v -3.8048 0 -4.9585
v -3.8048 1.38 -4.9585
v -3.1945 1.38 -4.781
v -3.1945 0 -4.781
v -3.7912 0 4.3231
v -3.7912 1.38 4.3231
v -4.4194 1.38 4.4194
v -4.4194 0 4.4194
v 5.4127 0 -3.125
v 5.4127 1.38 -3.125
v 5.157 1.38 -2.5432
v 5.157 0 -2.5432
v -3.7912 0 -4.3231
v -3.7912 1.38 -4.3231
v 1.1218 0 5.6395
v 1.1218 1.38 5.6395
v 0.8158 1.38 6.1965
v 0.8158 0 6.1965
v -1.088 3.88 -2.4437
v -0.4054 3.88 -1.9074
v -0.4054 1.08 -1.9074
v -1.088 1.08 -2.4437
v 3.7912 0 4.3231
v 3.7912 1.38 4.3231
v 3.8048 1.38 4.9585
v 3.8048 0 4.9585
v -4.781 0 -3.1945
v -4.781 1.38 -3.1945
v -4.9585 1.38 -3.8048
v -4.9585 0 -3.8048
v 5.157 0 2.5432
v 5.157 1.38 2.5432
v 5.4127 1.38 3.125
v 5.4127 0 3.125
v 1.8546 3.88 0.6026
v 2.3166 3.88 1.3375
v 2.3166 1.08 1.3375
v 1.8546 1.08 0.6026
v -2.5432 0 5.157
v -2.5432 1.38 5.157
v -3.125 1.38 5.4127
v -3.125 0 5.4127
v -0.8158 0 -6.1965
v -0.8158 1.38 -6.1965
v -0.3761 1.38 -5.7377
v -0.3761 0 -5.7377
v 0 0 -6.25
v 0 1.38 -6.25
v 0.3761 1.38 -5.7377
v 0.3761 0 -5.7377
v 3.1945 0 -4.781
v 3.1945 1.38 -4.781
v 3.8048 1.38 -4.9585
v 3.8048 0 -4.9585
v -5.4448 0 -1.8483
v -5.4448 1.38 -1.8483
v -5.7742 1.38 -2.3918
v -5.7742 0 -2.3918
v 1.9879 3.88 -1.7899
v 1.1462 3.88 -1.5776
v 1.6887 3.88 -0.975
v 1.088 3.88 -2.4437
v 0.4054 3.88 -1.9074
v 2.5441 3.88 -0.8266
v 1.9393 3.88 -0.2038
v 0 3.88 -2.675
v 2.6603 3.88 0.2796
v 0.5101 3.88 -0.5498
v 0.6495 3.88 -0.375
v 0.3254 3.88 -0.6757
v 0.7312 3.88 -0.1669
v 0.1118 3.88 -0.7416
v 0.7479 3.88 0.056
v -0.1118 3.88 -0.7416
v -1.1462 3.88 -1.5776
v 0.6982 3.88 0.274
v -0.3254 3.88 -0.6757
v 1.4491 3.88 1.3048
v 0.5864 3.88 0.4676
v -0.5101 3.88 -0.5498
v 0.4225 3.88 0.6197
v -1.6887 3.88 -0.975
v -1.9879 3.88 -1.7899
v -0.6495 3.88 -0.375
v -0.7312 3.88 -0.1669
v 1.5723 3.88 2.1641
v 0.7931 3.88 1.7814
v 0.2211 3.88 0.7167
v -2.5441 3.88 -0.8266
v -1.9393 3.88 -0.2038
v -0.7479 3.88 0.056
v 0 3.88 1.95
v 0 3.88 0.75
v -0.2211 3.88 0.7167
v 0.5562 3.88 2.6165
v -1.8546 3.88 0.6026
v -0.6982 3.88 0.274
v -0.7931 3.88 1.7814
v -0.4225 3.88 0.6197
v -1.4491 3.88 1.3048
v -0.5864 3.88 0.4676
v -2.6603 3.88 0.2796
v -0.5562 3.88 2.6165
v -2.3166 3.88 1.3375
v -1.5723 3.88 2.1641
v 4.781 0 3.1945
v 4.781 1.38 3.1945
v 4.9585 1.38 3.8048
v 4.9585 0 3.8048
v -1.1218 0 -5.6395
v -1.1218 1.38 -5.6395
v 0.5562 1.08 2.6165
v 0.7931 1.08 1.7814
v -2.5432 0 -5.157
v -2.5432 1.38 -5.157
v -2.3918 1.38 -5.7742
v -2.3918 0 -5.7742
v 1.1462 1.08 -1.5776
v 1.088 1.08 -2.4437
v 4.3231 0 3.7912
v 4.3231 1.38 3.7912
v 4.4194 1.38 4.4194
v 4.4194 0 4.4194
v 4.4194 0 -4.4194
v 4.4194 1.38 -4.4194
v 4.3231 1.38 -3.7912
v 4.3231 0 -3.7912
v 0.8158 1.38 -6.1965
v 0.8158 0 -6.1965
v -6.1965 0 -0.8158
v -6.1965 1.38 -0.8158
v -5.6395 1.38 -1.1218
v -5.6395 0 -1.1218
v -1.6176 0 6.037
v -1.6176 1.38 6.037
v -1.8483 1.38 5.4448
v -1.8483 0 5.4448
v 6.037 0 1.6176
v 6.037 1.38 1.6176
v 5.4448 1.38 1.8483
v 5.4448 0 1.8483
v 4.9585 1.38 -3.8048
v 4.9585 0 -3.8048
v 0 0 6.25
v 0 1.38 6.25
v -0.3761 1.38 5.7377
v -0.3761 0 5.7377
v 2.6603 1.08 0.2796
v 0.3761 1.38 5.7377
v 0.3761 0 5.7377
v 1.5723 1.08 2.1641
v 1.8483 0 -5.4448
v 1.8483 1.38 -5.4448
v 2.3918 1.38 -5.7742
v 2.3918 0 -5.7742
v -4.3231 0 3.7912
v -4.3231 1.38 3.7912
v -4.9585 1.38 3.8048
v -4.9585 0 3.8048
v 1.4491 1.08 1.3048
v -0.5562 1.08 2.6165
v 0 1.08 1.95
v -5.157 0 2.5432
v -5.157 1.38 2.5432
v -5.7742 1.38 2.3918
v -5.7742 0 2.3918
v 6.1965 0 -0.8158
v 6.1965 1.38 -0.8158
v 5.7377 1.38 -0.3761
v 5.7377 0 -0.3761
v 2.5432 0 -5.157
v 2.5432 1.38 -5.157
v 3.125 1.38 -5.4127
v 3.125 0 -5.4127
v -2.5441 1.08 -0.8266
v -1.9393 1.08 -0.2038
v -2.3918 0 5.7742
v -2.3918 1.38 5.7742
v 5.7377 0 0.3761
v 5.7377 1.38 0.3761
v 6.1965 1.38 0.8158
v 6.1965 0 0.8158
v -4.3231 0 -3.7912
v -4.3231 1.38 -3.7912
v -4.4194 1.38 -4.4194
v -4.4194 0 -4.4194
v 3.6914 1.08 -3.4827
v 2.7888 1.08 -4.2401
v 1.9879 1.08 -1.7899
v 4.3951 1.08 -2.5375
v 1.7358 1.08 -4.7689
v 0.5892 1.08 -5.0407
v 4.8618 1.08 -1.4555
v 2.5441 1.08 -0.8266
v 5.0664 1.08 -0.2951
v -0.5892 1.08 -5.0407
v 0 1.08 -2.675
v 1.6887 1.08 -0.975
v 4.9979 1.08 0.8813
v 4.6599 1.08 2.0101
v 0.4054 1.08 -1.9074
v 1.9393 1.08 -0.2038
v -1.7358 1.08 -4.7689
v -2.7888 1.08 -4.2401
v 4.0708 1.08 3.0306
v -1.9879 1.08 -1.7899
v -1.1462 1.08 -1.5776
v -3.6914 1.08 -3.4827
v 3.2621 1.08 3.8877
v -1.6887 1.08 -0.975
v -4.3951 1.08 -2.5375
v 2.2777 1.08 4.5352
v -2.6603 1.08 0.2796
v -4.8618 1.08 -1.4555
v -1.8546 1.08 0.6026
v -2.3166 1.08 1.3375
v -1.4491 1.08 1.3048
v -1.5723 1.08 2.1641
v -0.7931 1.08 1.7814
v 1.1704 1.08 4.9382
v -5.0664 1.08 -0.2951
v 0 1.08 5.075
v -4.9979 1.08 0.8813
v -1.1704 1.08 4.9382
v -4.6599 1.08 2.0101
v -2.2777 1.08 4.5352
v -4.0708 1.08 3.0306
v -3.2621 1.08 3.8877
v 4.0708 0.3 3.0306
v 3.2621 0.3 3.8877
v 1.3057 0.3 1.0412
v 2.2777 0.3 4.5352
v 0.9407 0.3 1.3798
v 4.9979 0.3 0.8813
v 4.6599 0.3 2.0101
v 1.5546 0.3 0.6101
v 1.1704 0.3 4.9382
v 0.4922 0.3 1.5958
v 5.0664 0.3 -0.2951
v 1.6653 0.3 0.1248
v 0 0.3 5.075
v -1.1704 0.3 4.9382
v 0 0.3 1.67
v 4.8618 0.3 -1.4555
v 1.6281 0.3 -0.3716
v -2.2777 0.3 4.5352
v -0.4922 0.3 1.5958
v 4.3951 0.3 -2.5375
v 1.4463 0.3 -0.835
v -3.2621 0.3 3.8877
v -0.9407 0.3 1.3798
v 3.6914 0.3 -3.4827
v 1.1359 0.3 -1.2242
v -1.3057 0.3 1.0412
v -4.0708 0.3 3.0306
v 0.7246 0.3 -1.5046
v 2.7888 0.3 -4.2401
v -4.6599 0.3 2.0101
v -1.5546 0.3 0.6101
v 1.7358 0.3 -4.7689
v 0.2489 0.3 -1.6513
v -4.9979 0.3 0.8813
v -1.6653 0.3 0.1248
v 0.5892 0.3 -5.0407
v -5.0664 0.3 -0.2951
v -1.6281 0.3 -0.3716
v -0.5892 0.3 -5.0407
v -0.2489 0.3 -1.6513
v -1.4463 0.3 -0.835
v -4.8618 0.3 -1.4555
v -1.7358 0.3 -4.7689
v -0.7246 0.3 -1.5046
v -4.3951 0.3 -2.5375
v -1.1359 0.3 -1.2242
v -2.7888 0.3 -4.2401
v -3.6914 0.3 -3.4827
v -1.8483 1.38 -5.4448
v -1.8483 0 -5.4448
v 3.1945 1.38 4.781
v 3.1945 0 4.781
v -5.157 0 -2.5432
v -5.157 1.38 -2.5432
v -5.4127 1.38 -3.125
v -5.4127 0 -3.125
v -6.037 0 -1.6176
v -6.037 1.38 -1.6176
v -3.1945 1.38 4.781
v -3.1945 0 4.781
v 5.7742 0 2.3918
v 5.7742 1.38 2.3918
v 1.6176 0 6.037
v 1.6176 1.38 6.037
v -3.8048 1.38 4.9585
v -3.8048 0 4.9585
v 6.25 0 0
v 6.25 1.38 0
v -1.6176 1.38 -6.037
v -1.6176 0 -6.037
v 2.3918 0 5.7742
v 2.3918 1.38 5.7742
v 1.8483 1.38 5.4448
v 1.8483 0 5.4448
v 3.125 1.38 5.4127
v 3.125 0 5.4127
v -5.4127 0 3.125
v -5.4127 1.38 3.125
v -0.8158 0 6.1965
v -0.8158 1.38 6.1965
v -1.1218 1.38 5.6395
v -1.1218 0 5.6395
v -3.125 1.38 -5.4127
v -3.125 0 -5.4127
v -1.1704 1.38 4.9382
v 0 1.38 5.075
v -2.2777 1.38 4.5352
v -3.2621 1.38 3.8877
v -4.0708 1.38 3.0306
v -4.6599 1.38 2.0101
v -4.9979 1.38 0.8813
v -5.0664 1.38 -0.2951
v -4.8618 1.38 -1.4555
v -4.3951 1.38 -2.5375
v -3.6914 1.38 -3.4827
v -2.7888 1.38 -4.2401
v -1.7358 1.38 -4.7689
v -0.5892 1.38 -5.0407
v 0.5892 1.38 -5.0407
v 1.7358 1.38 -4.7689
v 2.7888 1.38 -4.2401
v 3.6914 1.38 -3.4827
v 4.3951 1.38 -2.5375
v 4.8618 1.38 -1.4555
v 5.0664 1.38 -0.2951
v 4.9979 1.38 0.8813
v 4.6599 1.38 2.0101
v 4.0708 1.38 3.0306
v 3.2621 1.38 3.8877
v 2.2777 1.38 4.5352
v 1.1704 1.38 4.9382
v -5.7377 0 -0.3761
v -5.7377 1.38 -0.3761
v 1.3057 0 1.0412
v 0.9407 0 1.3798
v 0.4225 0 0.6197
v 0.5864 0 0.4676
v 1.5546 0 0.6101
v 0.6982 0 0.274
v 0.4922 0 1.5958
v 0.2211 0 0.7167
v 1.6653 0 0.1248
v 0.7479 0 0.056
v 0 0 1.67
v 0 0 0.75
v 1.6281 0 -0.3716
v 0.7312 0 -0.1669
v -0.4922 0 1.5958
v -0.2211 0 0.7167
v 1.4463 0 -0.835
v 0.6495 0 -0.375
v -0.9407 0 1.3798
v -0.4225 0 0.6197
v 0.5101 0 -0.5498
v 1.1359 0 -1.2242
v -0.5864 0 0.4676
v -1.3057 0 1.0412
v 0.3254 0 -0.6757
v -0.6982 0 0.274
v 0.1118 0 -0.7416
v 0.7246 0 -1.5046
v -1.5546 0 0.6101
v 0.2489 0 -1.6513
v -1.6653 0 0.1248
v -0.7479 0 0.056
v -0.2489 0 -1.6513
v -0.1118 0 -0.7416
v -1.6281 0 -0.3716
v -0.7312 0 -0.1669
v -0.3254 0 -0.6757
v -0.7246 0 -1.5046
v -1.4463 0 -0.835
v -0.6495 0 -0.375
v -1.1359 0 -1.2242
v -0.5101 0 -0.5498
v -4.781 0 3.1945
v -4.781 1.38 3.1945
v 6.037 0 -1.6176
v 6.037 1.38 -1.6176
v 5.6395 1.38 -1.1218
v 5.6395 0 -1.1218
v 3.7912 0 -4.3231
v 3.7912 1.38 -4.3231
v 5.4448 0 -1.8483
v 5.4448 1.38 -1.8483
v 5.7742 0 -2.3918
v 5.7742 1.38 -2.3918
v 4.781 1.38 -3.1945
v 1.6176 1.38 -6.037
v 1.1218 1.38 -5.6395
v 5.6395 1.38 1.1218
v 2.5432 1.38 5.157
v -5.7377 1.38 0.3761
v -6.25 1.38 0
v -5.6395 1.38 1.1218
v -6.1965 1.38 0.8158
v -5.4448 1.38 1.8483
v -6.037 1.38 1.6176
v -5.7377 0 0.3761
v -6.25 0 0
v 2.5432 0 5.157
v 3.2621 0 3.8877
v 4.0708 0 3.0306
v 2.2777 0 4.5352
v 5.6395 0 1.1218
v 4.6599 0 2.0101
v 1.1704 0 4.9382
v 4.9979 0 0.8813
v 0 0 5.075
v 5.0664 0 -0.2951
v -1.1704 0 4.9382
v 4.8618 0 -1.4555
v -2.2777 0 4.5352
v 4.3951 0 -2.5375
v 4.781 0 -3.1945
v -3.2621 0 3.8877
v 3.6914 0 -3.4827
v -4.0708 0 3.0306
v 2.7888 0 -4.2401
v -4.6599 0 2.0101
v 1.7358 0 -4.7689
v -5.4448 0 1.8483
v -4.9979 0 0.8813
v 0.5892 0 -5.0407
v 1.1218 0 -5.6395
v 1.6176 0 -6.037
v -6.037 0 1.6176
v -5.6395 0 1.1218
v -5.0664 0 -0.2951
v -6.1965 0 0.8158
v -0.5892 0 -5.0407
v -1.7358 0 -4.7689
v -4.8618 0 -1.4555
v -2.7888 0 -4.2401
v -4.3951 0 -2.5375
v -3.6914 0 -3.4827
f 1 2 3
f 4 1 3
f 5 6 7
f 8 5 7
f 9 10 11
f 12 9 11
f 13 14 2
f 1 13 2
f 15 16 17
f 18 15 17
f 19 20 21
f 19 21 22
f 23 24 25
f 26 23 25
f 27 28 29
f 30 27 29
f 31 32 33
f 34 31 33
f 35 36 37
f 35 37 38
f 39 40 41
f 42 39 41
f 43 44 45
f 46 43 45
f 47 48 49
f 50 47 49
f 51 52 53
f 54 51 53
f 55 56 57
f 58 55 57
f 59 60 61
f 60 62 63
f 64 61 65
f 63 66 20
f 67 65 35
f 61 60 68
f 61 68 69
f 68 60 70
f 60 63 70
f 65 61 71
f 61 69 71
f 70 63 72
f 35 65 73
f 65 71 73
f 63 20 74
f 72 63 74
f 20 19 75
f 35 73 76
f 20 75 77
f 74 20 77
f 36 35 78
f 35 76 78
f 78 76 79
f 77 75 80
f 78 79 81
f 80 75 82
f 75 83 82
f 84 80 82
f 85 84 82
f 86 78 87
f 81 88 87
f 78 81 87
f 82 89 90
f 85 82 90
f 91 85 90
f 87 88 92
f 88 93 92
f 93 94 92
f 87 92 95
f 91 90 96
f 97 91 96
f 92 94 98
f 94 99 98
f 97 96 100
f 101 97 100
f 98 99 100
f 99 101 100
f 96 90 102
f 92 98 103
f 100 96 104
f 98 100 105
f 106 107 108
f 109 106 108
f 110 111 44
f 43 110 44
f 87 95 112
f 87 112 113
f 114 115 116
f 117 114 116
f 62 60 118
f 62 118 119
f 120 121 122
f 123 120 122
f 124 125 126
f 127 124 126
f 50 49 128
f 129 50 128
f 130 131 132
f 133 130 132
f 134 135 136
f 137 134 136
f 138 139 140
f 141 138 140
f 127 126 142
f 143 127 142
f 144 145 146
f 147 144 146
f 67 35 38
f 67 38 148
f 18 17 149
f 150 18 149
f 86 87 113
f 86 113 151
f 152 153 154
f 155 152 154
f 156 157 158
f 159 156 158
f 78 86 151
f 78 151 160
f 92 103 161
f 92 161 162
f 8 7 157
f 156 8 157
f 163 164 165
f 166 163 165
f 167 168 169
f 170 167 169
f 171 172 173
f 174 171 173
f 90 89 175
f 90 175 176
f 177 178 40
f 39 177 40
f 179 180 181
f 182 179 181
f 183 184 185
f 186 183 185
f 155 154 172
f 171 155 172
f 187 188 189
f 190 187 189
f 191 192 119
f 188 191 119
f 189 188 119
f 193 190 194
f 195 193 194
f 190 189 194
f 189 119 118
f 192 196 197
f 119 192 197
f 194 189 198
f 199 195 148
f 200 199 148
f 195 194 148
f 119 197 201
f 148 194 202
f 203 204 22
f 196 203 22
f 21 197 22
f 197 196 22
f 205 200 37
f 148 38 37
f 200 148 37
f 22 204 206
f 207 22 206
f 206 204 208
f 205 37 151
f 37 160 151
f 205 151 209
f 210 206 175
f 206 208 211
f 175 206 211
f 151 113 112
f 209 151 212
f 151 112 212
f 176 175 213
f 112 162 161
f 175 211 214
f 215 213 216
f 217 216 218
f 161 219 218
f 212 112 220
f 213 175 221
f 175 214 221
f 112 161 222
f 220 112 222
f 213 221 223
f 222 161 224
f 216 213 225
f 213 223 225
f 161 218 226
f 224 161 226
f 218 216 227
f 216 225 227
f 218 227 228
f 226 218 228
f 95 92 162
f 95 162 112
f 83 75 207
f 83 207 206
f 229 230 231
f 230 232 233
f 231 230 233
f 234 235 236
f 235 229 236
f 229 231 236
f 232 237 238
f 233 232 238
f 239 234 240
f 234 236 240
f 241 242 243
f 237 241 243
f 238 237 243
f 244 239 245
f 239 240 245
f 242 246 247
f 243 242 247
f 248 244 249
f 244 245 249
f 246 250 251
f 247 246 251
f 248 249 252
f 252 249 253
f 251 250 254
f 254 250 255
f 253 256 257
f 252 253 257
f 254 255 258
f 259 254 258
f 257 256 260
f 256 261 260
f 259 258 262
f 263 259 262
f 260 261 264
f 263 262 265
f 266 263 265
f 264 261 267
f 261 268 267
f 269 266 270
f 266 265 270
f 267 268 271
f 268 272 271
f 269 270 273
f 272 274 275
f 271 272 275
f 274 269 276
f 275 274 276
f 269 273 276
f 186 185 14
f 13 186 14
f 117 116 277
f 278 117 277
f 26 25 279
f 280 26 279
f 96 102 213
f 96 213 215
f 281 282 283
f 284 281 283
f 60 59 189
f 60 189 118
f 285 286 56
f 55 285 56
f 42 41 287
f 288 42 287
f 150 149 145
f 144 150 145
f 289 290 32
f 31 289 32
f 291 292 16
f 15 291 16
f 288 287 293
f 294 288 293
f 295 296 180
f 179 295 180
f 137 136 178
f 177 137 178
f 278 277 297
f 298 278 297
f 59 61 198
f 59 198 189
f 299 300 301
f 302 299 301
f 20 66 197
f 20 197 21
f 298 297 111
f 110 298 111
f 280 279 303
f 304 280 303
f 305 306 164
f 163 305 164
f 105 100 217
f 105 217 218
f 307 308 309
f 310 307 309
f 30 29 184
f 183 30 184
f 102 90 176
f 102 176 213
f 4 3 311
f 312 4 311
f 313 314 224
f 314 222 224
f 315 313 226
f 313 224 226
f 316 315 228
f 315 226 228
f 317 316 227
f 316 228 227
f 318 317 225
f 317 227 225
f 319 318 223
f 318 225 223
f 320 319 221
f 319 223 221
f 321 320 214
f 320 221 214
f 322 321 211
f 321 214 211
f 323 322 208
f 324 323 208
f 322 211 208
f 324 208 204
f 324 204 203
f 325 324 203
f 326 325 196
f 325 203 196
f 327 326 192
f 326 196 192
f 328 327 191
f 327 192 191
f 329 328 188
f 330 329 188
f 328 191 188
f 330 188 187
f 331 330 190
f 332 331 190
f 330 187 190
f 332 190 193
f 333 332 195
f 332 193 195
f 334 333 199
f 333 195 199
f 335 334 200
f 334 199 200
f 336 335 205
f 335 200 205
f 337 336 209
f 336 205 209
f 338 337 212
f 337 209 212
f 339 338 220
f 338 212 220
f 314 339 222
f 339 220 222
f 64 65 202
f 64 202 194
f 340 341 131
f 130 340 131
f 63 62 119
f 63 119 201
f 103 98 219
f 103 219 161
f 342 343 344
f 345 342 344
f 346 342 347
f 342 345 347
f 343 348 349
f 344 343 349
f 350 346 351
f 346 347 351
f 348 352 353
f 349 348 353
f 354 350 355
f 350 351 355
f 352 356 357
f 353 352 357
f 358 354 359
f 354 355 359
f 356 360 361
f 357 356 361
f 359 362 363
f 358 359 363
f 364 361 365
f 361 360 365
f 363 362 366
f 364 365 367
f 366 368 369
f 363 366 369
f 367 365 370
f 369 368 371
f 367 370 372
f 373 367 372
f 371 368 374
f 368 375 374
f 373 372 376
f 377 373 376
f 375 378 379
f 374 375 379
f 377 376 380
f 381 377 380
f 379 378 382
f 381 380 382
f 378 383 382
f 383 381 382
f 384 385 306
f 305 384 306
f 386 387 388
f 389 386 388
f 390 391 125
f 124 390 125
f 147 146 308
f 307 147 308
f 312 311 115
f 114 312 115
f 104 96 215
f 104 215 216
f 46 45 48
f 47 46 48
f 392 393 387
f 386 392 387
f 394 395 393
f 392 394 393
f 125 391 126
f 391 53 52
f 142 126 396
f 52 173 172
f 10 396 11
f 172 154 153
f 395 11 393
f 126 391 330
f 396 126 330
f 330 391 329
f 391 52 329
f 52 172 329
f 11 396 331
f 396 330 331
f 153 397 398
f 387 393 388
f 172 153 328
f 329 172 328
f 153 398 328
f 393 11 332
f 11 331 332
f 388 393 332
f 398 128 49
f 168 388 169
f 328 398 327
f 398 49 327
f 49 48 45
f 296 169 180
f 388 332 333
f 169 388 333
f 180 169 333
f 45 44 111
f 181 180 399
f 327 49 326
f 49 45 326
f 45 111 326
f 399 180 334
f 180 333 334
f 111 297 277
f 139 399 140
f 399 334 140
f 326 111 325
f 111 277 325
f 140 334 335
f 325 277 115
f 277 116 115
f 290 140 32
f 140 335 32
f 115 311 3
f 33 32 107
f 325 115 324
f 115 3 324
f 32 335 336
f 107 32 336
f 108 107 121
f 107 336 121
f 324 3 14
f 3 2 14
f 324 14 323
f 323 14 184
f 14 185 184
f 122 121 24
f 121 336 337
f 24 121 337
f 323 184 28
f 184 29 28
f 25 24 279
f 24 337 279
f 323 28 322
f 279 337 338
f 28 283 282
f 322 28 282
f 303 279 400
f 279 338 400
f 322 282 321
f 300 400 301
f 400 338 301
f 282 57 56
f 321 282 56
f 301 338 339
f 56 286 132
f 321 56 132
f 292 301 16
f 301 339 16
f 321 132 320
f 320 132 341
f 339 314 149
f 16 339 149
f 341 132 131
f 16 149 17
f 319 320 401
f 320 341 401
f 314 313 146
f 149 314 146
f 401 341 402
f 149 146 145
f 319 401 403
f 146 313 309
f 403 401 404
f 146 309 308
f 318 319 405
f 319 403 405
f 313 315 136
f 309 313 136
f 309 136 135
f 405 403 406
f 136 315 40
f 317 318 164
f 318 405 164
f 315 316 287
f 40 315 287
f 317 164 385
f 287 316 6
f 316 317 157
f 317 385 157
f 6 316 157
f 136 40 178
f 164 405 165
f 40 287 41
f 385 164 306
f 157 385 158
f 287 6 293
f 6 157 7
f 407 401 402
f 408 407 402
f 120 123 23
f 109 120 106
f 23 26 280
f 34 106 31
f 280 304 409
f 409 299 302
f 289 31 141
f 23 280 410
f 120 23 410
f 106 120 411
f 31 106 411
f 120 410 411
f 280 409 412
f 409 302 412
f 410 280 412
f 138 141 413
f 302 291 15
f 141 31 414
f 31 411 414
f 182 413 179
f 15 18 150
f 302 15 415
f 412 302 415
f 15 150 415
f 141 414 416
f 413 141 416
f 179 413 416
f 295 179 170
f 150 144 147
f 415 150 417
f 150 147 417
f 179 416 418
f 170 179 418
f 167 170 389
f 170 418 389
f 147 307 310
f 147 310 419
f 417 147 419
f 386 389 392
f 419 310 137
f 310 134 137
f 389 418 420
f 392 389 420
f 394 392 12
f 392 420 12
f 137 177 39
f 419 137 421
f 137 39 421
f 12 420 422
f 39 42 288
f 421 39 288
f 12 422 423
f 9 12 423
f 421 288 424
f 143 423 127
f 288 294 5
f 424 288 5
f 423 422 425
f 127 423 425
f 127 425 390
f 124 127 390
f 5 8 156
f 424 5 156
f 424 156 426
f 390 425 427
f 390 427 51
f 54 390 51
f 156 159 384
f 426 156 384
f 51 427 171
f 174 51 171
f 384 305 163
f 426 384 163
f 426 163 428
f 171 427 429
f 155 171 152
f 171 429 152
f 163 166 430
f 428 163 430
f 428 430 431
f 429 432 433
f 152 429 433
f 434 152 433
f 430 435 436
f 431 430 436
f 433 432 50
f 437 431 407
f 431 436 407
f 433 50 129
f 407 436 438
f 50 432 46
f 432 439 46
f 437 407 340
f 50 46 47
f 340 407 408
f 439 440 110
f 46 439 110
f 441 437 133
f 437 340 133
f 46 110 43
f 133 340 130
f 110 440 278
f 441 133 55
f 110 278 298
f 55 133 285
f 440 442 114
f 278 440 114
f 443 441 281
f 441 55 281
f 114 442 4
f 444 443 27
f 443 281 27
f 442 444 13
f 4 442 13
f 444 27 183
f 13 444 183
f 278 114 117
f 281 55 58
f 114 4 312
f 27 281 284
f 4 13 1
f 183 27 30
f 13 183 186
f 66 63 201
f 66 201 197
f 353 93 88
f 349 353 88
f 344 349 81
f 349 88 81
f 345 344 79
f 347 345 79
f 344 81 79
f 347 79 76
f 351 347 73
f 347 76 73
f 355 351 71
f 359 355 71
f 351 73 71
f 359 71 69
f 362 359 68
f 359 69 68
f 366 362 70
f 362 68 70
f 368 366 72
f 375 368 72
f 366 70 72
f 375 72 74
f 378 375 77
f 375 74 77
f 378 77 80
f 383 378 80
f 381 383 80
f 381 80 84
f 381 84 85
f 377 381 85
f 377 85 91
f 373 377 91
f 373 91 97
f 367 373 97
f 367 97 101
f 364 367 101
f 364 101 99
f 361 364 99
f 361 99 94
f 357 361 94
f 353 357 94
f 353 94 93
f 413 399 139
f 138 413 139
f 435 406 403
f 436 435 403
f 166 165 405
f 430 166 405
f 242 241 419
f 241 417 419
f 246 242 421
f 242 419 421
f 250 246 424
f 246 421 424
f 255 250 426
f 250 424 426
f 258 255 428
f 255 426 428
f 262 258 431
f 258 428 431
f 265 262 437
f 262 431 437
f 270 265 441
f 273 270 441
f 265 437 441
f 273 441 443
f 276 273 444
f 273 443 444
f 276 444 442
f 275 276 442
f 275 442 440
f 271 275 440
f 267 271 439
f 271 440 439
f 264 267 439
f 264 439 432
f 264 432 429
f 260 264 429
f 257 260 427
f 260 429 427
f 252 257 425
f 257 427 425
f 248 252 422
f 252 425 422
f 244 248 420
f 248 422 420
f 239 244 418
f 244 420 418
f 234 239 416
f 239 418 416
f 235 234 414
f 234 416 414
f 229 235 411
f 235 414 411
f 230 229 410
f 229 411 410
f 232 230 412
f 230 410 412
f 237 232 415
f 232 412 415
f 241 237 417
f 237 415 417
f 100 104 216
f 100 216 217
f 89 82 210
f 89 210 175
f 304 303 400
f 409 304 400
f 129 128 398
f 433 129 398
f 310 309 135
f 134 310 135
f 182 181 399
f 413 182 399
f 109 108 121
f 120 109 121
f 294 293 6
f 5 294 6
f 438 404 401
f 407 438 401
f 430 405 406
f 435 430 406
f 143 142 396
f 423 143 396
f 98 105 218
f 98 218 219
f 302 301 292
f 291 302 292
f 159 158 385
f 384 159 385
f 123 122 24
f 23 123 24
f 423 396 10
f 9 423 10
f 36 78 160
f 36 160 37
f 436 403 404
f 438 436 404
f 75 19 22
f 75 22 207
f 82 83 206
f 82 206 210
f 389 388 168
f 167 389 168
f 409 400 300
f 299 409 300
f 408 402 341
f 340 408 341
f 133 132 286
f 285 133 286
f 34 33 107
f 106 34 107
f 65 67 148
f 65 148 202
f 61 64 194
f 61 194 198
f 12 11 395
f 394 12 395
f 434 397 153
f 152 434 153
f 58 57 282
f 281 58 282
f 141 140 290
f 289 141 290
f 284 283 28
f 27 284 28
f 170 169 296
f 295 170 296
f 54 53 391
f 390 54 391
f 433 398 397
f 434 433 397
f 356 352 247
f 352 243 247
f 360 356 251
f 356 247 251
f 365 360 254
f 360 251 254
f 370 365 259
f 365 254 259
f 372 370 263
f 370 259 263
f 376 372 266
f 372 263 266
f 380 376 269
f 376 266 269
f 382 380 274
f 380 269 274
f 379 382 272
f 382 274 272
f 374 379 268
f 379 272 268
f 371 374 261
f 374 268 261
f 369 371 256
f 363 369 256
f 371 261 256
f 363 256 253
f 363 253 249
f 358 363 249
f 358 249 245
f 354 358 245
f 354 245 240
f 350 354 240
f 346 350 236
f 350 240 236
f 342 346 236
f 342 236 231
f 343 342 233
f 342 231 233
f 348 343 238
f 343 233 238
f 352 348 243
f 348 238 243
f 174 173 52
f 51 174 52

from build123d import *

# Parameters (mm, degrees)
SKETCH2_R          = 7.25
CUT_EXTRUDE1_DEPTH = 10.185586535
SKETCH3_R          = 3.175
CUT_EXTRUDE3_DEPTH = 2.8
SKETCH4_R          = 0.75
CUT_EXTRUDE4_DEPTH = 10.652947736


with BuildPart() as part:
    # Sketch1 → Revolve1 (revolve)
    with BuildSketch(Plane.XY, mode=Mode.PRIVATE) as revolve1_sk:
        Polygon((0, 3.88), (0, 0), (1.67, 0), (1.67, 0.3), (5.075, 0.3), (5.075, 0), (6.25, 0), (6.25, 1.38), (5.075, 1.38), (5.075, 1.08), (2.675, 1.08), (2.675, 3.88), align=None)
    revolve(revolve1_sk.sketch.rotate(Axis((0, 3.88, 0), (0, -1, 0)), 90), axis=Axis((0, 3.88, 0), (0, -1, 0)))

    # Sketch2 → Cut-Extrude1 (cut, through all)
    with BuildSketch(Plane(origin=(0, 1.38, 0), x_dir=(1, 0, 0), z_dir=(0, 1, 0))):
        Circle(SKETCH2_R)
        Polygon((-0.376067993, 5.737688809), (0, 6.25), (0.376067993, 5.737688809), (0.815788701, 6.196530384), (1.121769352, 5.639515362), (1.617619032, 6.037036414), (1.848276925, 5.444848245), (2.391771452, 5.774247078), (2.543159969, 5.157018264), (3.125, 5.412658774), (3.19452884, 4.780950271), (3.804758931, 4.958458377), (3.791238437, 4.323078893), (4.419417382, 4.419417382), (4.323078893, 3.791238437), (4.958458377, 3.804758931), (4.780950271, 3.19452884), (5.412658774, 3.125), (5.157018264, 2.543159969), (5.774247078, 2.391771452), (5.444848245, 1.848276925), (6.037036414, 1.617619032), (5.639515362, 1.121769352), (6.196530384, 0.815788701), (5.737688809, 0.376067993), (6.25, 0), (5.737688809, -0.376067993), (6.196530384, -0.815788701), (5.639515362, -1.121769352), (6.037036414, -1.617619032), (5.444848245, -1.848276925), (5.774247078, -2.391771452), (5.157018264, -2.543159969), (5.412658774, -3.125), (4.780950271, -3.19452884), (4.958458377, -3.804758931), (4.323078893, -3.791238437), (4.419417382, -4.419417382), (3.791238437, -4.323078893), (3.804758931, -4.958458377), (3.19452884, -4.780950271), (3.125, -5.412658774), (2.543159969, -5.157018264), (2.391771452, -5.774247078), (1.848276925, -5.444848245), (1.617619032, -6.037036414), (1.121769352, -5.639515362), (0.815788701, -6.196530384), (0.376067993, -5.737688809), (0, -6.25), (-0.376067993, -5.737688809), (-0.815788701, -6.196530384), (-1.121769352, -5.639515362), (-1.617619032, -6.037036414), (-1.848276925, -5.444848245), (-2.391771452, -5.774247078), (-2.543159969, -5.157018264), (-3.125, -5.412658774), (-3.19452884, -4.780950271), (-3.804758931, -4.958458377), (-3.791238437, -4.323078893), (-4.419417382, -4.419417382), (-4.323078893, -3.791238437), (-4.958458377, -3.804758931), (-4.780950271, -3.19452884), (-5.412658774, -3.125), (-5.157018264, -2.543159969), (-5.774247078, -2.391771452), (-5.444848245, -1.848276925), (-6.037036414, -1.617619032), (-5.639515362, -1.121769352), (-6.196530384, -0.815788701), (-5.737688809, -0.376067993), (-6.25, 0), (-5.737688809, 0.376067993), (-6.196530384, 0.815788701), (-5.639515362, 1.121769352), (-6.037036414, 1.617619032), (-5.444848245, 1.848276925), (-5.774247078, 2.391771452), (-5.157018264, 2.543159969), (-5.412658774, 3.125), (-4.780950271, 3.19452884), (-4.958458377, 3.804758931), (-4.323078893, 3.791238437), (-4.419417382, 4.419417382), (-3.791238437, 4.323078893), (-3.804758931, 4.958458377), (-3.19452884, 4.780950271), (-3.125, 5.412658774), (-2.543159969, 5.157018264), (-2.391771452, 5.774247078), (-1.848276925, 5.444848245), (-1.617619032, 6.037036414), (-1.121769352, 5.639515362), (-0.815788701, 6.196530384), align=None, mode=Mode.SUBTRACT)
    extrude(amount=-CUT_EXTRUDE1_DEPTH, mode=Mode.SUBTRACT)

    # Sketch3 → Cut-Extrude3 (cut)
    with BuildSketch(Plane(origin=(0, 3.88, 0), x_dir=(1, 0, 0), z_dir=(0, 1, 0))):
        Circle(SKETCH3_R)
        Polygon((0, 2.675), (-0.405427797, 1.907387821), (-1.08802052, 2.443734099), (-1.146181242, 1.577583139), (-1.987912408, 1.789924372), (-1.688749537, 0.975), (-2.544076181, 0.82662046), (-1.939317696, 0.203830503), (-2.66034607, -0.279613639), (-1.854560207, -0.602583139), (-2.316617955, -1.3375), (-1.44913241, -1.304804682), (-1.57232555, -2.16412046), (-0.793136454, -1.781413642), (-0.556163773, -2.616544832), (0, -1.95), (0.556163773, -2.616544832), (0.793136454, -1.781413642), (1.57232555, -2.16412046), (1.44913241, -1.304804682), (2.316617955, -1.3375), (1.854560207, -0.602583139), (2.66034607, -0.279613639), (1.939317696, 0.203830503), (2.544076181, 0.82662046), (1.688749537, 0.975), (1.987912408, 1.789924372), (1.146181242, 1.577583139), (1.08802052, 2.443734099), (0.405427797, 1.907387821), align=None, mode=Mode.SUBTRACT)
    extrude(amount=-CUT_EXTRUDE3_DEPTH, mode=Mode.SUBTRACT)

    # Sketch4 → Cut-Extrude4 (cut, through all)
    with BuildSketch(Plane(origin=(0, 3.88, 0), x_dir=(1, 0, 0), z_dir=(0, 1, 0))):
        with Locations(Location((0, 0, 0), (0, 0, 270))):
            Circle(SKETCH4_R)
    extrude(amount=-CUT_EXTRUDE4_DEPTH, mode=Mode.SUBTRACT)


solid = part.part
